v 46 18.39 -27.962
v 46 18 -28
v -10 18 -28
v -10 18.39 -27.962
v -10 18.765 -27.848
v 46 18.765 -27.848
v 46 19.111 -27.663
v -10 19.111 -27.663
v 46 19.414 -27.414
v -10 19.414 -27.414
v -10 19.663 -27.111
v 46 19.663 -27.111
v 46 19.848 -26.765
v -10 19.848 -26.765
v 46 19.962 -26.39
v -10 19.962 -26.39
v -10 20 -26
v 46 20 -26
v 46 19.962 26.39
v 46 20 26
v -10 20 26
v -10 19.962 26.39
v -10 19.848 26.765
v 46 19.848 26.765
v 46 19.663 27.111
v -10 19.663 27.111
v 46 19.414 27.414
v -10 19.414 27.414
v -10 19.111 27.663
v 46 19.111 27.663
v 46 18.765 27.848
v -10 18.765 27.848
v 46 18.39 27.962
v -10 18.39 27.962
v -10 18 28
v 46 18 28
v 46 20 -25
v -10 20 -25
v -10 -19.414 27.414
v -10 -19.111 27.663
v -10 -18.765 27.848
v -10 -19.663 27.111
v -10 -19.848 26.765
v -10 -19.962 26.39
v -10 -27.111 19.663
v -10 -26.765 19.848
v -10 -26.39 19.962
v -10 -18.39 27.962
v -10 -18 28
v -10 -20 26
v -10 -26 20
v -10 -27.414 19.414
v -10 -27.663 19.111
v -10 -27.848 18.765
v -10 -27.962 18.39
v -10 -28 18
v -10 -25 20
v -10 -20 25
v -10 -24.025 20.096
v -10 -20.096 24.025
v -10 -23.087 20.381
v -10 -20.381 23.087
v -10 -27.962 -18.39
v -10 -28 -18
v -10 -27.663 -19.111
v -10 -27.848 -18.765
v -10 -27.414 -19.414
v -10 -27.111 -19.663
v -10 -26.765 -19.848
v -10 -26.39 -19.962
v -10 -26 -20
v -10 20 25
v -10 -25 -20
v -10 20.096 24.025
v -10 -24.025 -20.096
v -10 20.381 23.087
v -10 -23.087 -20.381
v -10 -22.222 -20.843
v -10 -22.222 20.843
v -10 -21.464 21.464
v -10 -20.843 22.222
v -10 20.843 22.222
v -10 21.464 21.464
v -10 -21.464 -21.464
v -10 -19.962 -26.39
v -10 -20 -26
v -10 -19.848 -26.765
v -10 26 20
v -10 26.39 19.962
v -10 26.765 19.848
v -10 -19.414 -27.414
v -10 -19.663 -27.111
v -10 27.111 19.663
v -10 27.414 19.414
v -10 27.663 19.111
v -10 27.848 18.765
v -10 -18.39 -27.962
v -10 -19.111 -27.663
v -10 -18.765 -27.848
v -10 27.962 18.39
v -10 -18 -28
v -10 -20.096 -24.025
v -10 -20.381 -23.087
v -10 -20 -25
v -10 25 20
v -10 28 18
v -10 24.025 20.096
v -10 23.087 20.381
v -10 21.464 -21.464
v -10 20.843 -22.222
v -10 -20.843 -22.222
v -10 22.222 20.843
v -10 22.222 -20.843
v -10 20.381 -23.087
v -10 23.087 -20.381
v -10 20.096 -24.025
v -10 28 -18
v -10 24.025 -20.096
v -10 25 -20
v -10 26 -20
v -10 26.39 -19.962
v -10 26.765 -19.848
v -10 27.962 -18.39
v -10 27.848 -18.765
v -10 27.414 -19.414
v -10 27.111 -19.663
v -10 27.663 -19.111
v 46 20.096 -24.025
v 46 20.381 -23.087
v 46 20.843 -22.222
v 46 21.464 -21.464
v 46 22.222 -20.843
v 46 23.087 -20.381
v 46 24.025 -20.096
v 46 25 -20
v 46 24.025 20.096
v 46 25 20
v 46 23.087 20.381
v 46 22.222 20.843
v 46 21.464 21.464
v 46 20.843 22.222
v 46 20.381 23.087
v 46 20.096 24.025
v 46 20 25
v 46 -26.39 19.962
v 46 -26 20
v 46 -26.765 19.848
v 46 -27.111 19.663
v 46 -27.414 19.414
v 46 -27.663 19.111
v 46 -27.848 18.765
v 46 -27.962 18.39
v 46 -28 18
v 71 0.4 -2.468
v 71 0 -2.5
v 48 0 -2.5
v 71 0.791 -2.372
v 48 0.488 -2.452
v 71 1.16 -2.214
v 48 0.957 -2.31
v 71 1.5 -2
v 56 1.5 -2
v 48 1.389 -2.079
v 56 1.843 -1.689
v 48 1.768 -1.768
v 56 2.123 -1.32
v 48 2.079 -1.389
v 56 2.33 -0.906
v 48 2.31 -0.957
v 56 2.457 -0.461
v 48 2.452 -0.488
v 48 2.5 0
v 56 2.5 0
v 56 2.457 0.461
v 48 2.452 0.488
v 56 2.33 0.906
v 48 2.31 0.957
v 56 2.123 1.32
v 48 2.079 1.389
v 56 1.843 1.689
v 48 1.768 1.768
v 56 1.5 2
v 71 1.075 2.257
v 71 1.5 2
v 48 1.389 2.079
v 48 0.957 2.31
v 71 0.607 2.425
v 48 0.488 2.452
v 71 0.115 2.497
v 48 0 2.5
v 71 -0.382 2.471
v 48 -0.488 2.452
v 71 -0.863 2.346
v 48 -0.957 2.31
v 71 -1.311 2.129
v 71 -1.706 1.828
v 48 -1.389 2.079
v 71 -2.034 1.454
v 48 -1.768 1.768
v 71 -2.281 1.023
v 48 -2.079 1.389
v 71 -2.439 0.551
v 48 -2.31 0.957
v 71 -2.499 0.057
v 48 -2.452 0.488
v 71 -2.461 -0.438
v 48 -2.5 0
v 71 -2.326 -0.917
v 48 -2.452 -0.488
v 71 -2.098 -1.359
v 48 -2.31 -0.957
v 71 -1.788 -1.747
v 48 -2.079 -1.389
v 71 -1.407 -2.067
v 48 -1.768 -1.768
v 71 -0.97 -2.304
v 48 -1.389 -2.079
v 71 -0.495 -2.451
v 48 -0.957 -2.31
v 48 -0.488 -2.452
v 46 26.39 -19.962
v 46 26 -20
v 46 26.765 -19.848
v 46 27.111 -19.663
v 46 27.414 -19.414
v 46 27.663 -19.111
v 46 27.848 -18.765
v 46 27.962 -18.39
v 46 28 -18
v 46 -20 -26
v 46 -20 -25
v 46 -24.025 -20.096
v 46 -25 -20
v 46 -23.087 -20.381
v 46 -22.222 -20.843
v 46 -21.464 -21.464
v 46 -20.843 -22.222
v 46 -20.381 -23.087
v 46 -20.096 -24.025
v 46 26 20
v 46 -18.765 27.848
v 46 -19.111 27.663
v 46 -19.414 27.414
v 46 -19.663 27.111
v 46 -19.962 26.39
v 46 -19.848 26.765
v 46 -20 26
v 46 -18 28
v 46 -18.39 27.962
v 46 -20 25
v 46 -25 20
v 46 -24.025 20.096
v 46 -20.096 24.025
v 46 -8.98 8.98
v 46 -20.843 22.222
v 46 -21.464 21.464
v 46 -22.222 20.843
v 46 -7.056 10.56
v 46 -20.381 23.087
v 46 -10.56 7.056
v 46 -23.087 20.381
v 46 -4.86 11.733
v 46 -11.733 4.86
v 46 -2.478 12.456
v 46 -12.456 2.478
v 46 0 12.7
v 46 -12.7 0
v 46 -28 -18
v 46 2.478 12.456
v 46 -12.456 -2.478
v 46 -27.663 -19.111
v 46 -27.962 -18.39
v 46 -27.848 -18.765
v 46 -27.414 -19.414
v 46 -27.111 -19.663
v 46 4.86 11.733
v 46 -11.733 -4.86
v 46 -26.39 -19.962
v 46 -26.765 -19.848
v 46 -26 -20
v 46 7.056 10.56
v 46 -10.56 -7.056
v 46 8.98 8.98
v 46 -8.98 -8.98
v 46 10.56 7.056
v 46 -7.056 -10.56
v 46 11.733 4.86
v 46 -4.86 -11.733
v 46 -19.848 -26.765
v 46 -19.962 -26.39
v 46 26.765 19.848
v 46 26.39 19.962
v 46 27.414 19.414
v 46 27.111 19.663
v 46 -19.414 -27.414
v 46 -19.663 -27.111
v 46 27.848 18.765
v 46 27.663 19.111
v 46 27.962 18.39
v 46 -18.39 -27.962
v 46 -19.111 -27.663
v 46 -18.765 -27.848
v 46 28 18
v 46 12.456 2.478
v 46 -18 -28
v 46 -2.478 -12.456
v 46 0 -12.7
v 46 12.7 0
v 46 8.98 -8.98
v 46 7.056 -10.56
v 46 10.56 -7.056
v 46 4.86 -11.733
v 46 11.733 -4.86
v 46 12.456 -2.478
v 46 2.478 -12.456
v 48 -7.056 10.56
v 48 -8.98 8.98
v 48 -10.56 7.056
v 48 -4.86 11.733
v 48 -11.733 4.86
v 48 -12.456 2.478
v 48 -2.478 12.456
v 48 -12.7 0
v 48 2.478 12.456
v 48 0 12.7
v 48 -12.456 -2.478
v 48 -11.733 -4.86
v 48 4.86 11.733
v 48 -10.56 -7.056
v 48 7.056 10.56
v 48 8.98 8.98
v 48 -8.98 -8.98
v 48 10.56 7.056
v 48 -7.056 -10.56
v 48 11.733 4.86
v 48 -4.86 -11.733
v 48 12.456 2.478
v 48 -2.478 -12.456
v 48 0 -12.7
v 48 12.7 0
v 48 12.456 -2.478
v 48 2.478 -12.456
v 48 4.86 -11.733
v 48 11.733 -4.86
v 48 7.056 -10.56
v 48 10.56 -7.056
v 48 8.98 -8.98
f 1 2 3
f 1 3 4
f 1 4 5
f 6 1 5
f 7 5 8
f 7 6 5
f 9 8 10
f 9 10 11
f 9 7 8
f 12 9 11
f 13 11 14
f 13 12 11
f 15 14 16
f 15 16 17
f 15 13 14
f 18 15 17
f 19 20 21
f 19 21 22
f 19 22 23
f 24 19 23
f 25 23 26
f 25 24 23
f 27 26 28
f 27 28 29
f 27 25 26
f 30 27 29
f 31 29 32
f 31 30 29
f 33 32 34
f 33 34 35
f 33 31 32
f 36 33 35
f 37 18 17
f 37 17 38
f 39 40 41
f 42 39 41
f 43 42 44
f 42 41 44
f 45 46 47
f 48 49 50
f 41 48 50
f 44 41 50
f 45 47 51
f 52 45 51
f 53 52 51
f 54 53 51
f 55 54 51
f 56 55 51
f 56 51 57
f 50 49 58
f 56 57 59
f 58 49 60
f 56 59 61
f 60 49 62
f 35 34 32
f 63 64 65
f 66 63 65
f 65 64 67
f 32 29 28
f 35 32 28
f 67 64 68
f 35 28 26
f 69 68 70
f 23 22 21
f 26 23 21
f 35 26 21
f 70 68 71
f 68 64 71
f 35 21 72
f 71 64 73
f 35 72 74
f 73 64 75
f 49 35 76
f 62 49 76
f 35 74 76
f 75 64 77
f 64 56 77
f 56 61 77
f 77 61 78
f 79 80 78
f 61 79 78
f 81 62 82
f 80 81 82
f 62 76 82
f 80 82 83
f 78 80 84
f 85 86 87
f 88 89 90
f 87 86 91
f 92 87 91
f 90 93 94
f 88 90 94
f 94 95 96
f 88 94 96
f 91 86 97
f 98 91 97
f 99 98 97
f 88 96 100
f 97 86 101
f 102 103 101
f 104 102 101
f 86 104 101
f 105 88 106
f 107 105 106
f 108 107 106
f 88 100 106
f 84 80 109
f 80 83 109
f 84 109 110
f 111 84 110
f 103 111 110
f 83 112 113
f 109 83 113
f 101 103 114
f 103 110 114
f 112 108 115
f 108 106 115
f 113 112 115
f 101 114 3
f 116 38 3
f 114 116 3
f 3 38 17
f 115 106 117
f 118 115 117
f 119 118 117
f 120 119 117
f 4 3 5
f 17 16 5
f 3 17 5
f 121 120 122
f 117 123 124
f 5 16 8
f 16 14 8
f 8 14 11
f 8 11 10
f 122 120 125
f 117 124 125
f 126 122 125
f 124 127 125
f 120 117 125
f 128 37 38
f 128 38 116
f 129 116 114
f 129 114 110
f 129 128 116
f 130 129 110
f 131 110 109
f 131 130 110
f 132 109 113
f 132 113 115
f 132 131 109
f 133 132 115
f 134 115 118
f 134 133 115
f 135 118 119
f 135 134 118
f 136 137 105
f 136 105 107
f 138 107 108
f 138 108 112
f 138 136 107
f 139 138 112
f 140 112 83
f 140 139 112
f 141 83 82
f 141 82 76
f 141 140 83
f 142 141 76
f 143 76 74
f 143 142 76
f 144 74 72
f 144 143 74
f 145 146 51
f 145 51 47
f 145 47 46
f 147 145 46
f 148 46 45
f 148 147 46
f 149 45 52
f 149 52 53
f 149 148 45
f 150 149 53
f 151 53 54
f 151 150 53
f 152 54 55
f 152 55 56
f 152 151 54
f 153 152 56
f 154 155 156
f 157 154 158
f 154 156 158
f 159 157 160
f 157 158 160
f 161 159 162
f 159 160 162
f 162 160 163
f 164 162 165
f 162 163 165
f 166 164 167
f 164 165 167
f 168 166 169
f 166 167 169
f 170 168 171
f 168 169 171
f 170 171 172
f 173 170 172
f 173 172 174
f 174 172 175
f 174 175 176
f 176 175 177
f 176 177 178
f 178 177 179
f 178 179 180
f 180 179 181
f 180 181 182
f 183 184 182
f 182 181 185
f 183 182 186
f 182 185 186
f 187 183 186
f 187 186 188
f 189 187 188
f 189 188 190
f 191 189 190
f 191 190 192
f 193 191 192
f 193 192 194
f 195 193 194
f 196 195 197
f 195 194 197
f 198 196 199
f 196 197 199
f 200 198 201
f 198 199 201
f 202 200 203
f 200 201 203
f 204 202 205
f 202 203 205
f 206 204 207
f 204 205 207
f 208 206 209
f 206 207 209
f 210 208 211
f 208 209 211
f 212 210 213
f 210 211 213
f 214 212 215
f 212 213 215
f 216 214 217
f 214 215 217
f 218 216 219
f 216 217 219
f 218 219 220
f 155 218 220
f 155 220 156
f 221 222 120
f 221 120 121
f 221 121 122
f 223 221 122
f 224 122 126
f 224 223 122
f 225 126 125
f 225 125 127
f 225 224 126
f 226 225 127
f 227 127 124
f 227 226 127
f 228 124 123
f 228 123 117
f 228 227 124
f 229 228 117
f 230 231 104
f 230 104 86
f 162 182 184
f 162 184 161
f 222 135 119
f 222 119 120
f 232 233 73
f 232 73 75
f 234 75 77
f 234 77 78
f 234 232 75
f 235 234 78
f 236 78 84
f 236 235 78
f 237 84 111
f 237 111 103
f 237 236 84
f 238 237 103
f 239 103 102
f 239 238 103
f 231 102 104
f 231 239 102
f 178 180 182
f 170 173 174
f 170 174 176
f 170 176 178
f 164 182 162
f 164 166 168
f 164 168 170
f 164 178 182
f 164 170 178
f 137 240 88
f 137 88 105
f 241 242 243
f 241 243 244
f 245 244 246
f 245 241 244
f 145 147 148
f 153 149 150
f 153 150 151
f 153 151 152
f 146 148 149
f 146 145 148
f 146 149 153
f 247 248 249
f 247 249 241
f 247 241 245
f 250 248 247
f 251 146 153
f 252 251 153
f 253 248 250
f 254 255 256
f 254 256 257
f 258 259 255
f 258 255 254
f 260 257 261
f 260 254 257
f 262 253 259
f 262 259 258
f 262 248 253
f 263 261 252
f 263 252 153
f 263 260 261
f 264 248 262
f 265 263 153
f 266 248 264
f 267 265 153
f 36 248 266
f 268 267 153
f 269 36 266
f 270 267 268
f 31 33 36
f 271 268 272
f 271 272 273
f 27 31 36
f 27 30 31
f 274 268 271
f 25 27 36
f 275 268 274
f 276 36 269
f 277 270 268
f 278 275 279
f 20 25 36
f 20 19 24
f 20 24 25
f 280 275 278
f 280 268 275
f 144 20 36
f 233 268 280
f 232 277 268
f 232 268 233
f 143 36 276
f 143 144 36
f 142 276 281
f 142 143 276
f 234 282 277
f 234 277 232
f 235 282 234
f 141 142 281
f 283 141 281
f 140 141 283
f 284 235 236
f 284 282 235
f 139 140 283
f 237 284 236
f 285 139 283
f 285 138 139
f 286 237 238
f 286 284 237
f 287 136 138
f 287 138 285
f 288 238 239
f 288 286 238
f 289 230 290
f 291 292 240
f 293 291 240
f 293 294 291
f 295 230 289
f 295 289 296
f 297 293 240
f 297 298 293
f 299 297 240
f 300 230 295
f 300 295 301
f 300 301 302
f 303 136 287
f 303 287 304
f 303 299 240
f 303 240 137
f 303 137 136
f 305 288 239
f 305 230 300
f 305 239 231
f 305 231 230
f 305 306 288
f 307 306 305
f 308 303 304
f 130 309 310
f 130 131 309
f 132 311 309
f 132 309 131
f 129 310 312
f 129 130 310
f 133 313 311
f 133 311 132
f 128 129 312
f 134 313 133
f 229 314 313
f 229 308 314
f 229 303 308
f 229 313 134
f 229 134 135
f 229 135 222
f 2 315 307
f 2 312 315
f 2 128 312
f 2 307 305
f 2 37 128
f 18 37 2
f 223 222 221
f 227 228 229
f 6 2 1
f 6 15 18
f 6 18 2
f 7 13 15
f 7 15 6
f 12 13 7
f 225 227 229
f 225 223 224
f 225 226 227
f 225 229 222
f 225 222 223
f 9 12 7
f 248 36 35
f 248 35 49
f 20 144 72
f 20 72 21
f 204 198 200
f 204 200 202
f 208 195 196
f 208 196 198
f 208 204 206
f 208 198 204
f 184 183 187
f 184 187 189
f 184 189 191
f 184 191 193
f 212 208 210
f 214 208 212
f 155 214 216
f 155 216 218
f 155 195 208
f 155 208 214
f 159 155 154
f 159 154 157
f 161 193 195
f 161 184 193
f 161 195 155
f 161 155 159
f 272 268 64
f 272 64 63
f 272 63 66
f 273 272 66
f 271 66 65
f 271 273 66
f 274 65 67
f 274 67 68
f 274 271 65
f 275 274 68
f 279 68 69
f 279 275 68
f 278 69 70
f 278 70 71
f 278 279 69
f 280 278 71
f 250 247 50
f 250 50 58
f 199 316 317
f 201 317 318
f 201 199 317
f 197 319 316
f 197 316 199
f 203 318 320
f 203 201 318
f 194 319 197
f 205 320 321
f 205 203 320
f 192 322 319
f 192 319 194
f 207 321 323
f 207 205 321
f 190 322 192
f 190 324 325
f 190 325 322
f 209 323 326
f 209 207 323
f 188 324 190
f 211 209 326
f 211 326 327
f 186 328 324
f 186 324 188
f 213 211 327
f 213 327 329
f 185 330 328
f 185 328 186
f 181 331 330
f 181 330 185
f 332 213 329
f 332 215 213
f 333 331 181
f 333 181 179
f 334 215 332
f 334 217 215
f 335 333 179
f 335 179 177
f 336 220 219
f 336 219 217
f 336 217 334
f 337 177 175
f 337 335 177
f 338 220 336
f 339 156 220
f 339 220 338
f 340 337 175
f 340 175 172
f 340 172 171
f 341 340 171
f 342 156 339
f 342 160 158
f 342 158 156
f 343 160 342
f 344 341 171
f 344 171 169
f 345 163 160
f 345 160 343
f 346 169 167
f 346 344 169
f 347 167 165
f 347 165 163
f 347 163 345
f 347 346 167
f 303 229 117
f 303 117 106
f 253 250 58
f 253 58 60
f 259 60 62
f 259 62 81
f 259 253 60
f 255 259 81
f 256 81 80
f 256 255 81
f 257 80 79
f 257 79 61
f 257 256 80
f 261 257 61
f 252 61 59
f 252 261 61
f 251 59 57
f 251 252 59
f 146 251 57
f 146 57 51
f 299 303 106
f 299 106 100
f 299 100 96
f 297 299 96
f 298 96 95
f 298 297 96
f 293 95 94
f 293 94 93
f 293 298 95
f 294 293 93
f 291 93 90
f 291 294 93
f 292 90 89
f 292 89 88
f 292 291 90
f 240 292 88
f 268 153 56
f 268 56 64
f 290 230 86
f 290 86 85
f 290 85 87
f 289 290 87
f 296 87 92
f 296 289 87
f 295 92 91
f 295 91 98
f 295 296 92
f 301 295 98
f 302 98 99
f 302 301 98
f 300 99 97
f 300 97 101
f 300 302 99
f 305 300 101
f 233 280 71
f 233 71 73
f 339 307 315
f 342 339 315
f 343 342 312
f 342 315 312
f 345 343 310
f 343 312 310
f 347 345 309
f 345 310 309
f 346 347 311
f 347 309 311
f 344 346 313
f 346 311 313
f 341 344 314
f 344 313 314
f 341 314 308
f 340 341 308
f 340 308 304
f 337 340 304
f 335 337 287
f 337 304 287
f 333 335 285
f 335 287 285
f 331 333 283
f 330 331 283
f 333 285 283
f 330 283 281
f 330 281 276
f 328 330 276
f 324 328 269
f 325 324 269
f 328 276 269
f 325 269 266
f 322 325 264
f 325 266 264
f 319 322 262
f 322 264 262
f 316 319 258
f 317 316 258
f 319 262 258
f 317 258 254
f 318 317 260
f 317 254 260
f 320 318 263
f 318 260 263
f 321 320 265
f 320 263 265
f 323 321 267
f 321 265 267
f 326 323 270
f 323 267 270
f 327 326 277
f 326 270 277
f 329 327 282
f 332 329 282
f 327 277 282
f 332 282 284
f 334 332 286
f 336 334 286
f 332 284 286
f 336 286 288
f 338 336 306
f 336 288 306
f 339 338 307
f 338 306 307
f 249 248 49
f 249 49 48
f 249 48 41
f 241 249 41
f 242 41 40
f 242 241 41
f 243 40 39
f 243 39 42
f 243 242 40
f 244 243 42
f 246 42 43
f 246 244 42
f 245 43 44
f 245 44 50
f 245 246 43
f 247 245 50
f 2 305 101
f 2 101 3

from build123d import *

# Parameters (mm, degrees)
BOSS_EXTRUDE1_DEPTH = 10
BOSS_EXTRUDE2_START = 36
BOSS_EXTRUDE2_DEPTH = 36
BOSS_EXTRUDE3_START = 10
BOSS_EXTRUDE3_DEPTH = 10
SKETCH4_R           = 2.5
BOSS_EXTRUDE4_DEPTH = 25
SKETCH4_3_R         = 12.7
BOSS_EXTRUDE5_DEPTH = 2
CUT_EXTRUDE1_START  = -15
CUT_EXTRUDE1_DEPTH  = 15


with BuildPart() as part:
    # Sketch1 → Boss-Extrude1 (new body)
    with BuildSketch(Plane(origin=(0, 0, 0), x_dir=(0, 0, -1), z_dir=(1, 0, 0))):
        with BuildLine():
            Line((-20, 26), (-20, 25))
            ThreePointArc((-20, 25), (-21.464466094, 21.464466094), (-25, 20))
            Line((-25, 20), (-26, 20))
            ThreePointArc((-26, 20), (-27.414213562, 19.414213562), (-28, 18))
            Line((-28, 18), (-28, -18))
            ThreePointArc((-28, -18), (-27.414213562, -19.414213562), (-26, -20))
            Line((-26, -20), (-25, -20))
            ThreePointArc((-25, -20), (-21.464466094, -21.464466094), (-20, -25))
            Line((-20, -25), (-20, -26))
            ThreePointArc((-20, -26), (-19.414213562, -27.414213562), (-18, -28))
            Line((-18, -28), (18, -28))
            ThreePointArc((18, -28), (19.414213562, -27.414213562), (20, -26))
            Line((20, -26), (20, -25))
            ThreePointArc((20, -25), (21.464466094, -21.464466094), (25, -20))
            Line((25, -20), (26, -20))
            ThreePointArc((26, -20), (27.414213562, -19.414213562), (28, -18))
            Line((28, -18), (28, 18))
            ThreePointArc((28, 18), (27.414213562, 19.414213562), (26, 20))
            Line((26, 20), (25, 20))
            ThreePointArc((25, 20), (21.464466094, 21.464466094), (20, 25))
            Line((20, 25), (20, 26))
            ThreePointArc((20, 26), (19.414213562, 27.414213562), (18, 28))
            Line((18, 28), (-18, 28))
            ThreePointArc((-18, 28), (-19.414213562, 27.414213562), (-20, 26))
        make_face()
    extrude(amount=-BOSS_EXTRUDE1_DEPTH)

    # Sketch2 → Boss-Extrude2 (add)
    with BuildSketch(Plane(origin=(0, 0, 0), x_dir=(0, 0, -1), z_dir=(1, 0, 0)).offset(BOSS_EXTRUDE2_START)):
        with BuildLine():
            Line((20, -26), (20, -25))
            ThreePointArc((20, -25), (21.464466094, -21.464466094), (25, -20))
            Line((25, -20), (26, -20))
            ThreePointArc((26, -20), (27.414213562, -19.414213562), (28, -18))
            Line((28, -18), (28, 18))
            ThreePointArc((28, 18), (27.414213562, 19.414213562), (26, 20))
            Line((26, 20), (25, 20))
            ThreePointArc((25, 20), (21.464466094, 21.464466094), (20, 25))
            Line((20, 25), (20, 26))
            ThreePointArc((20, 26), (19.414213562, 27.414213562), (18, 28))
            Line((18, 28), (-18, 28))
            ThreePointArc((-18, 28), (-19.414213562, 27.414213562), (-20, 26))
            Line((-20, 26), (-20, 25))
            ThreePointArc((-20, 25), (-21.464466094, 21.464466094), (-25, 20))
            Line((-25, 20), (-26, 20))
            ThreePointArc((-26, 20), (-27.414213562, 19.414213562), (-28, 18))
            Line((-28, 18), (-28, -18))
            ThreePointArc((-28, -18), (-27.414213562, -19.414213562), (-26, -20))
            Line((-26, -20), (-25, -20))
            ThreePointArc((-25, -20), (-21.464466094, -21.464466094), (-20, -25))
            Line((-20, -25), (-20, -26))
            ThreePointArc((-20, -26), (-19.414213562, -27.414213562), (-18, -28))
            Line((-18, -28), (18, -28))
            ThreePointArc((18, -28), (19.414213562, -27.414213562), (20, -26))
        make_face()
    extrude(amount=-BOSS_EXTRUDE2_DEPTH)

    # Sketch3 → Boss-Extrude3 (add)
    with BuildSketch(Plane(origin=(36, 0, 0), x_dir=(0, 0, -1), z_dir=(1, 0, 0)).offset(BOSS_EXTRUDE3_START)):
        with BuildLine():
            Line((-26, -20), (-25, -20))
            ThreePointArc((-25, -20), (-21.464466094, -21.464466094), (-20, -25))
            Line((-20, -25), (-20, -26))
            ThreePointArc((-20, -26), (-19.414213562, -27.414213562), (-18, -28))
            Line((-18, -28), (18, -28))
            ThreePointArc((18, -28), (19.414213562, -27.414213562), (20, -26))
            Line((20, -26), (20, -25))
            ThreePointArc((20, -25), (21.464466094, -21.464466094), (25, -20))
            Line((25, -20), (26, -20))
            ThreePointArc((26, -20), (27.414213562, -19.414213562), (28, -18))
            Line((28, -18), (28, 18))
            ThreePointArc((28, 18), (27.414213562, 19.414213562), (26, 20))
            Line((26, 20), (25, 20))
            ThreePointArc((25, 20), (21.464466094, 21.464466094), (20, 25))
            Line((20, 25), (20, 26))
            ThreePointArc((20, 26), (19.414213562, 27.414213562), (18, 28))
            Line((18, 28), (-18, 28))
            ThreePointArc((-18, 28), (-19.414213562, 27.414213562), (-20, 26))
            Line((-20, 26), (-20, 25))
            ThreePointArc((-20, 25), (-21.464466094, 21.464466094), (-25, 20))
            Line((-25, 20), (-26, 20))
            ThreePointArc((-26, 20), (-27.414213562, 19.414213562), (-28, 18))
            Line((-28, 18), (-28, -18))
            ThreePointArc((-28, -18), (-27.414213562, -19.414213562), (-26, -20))
        make_face()
    extrude(amount=-BOSS_EXTRUDE3_DEPTH)

    # Sketch4 → Boss-Extrude4 (add)
    with BuildSketch(Plane(origin=(46, 0, 0), x_dir=(0, 0, -1), z_dir=(1, 0, 0))):
        Circle(SKETCH4_R)
    extrude(amount=BOSS_EXTRUDE4_DEPTH)

    # Sketch4<3> → Boss-Extrude5 (add)
    with BuildSketch(Plane(origin=(46, 0, 0), x_dir=(0, 0, -1), z_dir=(1, 0, 0))):
        Circle(SKETCH4_3_R)
    extrude(amount=BOSS_EXTRUDE5_DEPTH)

    # Sketch5 → Cut-Extrude1 (cut)
    with BuildSketch(Plane(origin=(71, 0, 0), x_dir=(0, 0, -1), z_dir=(1, 0, 0)).offset(CUT_EXTRUDE1_START)):
        with BuildLine():
            Line((-2, 1.5), (2, 1.5))
            ThreePointArc((2, 1.5), (0, 2.5), (-2, 1.5))
        make_face()
    extrude(amount=CUT_EXTRUDE1_DEPTH, mode=Mode.SUBTRACT)


solid = part.part
